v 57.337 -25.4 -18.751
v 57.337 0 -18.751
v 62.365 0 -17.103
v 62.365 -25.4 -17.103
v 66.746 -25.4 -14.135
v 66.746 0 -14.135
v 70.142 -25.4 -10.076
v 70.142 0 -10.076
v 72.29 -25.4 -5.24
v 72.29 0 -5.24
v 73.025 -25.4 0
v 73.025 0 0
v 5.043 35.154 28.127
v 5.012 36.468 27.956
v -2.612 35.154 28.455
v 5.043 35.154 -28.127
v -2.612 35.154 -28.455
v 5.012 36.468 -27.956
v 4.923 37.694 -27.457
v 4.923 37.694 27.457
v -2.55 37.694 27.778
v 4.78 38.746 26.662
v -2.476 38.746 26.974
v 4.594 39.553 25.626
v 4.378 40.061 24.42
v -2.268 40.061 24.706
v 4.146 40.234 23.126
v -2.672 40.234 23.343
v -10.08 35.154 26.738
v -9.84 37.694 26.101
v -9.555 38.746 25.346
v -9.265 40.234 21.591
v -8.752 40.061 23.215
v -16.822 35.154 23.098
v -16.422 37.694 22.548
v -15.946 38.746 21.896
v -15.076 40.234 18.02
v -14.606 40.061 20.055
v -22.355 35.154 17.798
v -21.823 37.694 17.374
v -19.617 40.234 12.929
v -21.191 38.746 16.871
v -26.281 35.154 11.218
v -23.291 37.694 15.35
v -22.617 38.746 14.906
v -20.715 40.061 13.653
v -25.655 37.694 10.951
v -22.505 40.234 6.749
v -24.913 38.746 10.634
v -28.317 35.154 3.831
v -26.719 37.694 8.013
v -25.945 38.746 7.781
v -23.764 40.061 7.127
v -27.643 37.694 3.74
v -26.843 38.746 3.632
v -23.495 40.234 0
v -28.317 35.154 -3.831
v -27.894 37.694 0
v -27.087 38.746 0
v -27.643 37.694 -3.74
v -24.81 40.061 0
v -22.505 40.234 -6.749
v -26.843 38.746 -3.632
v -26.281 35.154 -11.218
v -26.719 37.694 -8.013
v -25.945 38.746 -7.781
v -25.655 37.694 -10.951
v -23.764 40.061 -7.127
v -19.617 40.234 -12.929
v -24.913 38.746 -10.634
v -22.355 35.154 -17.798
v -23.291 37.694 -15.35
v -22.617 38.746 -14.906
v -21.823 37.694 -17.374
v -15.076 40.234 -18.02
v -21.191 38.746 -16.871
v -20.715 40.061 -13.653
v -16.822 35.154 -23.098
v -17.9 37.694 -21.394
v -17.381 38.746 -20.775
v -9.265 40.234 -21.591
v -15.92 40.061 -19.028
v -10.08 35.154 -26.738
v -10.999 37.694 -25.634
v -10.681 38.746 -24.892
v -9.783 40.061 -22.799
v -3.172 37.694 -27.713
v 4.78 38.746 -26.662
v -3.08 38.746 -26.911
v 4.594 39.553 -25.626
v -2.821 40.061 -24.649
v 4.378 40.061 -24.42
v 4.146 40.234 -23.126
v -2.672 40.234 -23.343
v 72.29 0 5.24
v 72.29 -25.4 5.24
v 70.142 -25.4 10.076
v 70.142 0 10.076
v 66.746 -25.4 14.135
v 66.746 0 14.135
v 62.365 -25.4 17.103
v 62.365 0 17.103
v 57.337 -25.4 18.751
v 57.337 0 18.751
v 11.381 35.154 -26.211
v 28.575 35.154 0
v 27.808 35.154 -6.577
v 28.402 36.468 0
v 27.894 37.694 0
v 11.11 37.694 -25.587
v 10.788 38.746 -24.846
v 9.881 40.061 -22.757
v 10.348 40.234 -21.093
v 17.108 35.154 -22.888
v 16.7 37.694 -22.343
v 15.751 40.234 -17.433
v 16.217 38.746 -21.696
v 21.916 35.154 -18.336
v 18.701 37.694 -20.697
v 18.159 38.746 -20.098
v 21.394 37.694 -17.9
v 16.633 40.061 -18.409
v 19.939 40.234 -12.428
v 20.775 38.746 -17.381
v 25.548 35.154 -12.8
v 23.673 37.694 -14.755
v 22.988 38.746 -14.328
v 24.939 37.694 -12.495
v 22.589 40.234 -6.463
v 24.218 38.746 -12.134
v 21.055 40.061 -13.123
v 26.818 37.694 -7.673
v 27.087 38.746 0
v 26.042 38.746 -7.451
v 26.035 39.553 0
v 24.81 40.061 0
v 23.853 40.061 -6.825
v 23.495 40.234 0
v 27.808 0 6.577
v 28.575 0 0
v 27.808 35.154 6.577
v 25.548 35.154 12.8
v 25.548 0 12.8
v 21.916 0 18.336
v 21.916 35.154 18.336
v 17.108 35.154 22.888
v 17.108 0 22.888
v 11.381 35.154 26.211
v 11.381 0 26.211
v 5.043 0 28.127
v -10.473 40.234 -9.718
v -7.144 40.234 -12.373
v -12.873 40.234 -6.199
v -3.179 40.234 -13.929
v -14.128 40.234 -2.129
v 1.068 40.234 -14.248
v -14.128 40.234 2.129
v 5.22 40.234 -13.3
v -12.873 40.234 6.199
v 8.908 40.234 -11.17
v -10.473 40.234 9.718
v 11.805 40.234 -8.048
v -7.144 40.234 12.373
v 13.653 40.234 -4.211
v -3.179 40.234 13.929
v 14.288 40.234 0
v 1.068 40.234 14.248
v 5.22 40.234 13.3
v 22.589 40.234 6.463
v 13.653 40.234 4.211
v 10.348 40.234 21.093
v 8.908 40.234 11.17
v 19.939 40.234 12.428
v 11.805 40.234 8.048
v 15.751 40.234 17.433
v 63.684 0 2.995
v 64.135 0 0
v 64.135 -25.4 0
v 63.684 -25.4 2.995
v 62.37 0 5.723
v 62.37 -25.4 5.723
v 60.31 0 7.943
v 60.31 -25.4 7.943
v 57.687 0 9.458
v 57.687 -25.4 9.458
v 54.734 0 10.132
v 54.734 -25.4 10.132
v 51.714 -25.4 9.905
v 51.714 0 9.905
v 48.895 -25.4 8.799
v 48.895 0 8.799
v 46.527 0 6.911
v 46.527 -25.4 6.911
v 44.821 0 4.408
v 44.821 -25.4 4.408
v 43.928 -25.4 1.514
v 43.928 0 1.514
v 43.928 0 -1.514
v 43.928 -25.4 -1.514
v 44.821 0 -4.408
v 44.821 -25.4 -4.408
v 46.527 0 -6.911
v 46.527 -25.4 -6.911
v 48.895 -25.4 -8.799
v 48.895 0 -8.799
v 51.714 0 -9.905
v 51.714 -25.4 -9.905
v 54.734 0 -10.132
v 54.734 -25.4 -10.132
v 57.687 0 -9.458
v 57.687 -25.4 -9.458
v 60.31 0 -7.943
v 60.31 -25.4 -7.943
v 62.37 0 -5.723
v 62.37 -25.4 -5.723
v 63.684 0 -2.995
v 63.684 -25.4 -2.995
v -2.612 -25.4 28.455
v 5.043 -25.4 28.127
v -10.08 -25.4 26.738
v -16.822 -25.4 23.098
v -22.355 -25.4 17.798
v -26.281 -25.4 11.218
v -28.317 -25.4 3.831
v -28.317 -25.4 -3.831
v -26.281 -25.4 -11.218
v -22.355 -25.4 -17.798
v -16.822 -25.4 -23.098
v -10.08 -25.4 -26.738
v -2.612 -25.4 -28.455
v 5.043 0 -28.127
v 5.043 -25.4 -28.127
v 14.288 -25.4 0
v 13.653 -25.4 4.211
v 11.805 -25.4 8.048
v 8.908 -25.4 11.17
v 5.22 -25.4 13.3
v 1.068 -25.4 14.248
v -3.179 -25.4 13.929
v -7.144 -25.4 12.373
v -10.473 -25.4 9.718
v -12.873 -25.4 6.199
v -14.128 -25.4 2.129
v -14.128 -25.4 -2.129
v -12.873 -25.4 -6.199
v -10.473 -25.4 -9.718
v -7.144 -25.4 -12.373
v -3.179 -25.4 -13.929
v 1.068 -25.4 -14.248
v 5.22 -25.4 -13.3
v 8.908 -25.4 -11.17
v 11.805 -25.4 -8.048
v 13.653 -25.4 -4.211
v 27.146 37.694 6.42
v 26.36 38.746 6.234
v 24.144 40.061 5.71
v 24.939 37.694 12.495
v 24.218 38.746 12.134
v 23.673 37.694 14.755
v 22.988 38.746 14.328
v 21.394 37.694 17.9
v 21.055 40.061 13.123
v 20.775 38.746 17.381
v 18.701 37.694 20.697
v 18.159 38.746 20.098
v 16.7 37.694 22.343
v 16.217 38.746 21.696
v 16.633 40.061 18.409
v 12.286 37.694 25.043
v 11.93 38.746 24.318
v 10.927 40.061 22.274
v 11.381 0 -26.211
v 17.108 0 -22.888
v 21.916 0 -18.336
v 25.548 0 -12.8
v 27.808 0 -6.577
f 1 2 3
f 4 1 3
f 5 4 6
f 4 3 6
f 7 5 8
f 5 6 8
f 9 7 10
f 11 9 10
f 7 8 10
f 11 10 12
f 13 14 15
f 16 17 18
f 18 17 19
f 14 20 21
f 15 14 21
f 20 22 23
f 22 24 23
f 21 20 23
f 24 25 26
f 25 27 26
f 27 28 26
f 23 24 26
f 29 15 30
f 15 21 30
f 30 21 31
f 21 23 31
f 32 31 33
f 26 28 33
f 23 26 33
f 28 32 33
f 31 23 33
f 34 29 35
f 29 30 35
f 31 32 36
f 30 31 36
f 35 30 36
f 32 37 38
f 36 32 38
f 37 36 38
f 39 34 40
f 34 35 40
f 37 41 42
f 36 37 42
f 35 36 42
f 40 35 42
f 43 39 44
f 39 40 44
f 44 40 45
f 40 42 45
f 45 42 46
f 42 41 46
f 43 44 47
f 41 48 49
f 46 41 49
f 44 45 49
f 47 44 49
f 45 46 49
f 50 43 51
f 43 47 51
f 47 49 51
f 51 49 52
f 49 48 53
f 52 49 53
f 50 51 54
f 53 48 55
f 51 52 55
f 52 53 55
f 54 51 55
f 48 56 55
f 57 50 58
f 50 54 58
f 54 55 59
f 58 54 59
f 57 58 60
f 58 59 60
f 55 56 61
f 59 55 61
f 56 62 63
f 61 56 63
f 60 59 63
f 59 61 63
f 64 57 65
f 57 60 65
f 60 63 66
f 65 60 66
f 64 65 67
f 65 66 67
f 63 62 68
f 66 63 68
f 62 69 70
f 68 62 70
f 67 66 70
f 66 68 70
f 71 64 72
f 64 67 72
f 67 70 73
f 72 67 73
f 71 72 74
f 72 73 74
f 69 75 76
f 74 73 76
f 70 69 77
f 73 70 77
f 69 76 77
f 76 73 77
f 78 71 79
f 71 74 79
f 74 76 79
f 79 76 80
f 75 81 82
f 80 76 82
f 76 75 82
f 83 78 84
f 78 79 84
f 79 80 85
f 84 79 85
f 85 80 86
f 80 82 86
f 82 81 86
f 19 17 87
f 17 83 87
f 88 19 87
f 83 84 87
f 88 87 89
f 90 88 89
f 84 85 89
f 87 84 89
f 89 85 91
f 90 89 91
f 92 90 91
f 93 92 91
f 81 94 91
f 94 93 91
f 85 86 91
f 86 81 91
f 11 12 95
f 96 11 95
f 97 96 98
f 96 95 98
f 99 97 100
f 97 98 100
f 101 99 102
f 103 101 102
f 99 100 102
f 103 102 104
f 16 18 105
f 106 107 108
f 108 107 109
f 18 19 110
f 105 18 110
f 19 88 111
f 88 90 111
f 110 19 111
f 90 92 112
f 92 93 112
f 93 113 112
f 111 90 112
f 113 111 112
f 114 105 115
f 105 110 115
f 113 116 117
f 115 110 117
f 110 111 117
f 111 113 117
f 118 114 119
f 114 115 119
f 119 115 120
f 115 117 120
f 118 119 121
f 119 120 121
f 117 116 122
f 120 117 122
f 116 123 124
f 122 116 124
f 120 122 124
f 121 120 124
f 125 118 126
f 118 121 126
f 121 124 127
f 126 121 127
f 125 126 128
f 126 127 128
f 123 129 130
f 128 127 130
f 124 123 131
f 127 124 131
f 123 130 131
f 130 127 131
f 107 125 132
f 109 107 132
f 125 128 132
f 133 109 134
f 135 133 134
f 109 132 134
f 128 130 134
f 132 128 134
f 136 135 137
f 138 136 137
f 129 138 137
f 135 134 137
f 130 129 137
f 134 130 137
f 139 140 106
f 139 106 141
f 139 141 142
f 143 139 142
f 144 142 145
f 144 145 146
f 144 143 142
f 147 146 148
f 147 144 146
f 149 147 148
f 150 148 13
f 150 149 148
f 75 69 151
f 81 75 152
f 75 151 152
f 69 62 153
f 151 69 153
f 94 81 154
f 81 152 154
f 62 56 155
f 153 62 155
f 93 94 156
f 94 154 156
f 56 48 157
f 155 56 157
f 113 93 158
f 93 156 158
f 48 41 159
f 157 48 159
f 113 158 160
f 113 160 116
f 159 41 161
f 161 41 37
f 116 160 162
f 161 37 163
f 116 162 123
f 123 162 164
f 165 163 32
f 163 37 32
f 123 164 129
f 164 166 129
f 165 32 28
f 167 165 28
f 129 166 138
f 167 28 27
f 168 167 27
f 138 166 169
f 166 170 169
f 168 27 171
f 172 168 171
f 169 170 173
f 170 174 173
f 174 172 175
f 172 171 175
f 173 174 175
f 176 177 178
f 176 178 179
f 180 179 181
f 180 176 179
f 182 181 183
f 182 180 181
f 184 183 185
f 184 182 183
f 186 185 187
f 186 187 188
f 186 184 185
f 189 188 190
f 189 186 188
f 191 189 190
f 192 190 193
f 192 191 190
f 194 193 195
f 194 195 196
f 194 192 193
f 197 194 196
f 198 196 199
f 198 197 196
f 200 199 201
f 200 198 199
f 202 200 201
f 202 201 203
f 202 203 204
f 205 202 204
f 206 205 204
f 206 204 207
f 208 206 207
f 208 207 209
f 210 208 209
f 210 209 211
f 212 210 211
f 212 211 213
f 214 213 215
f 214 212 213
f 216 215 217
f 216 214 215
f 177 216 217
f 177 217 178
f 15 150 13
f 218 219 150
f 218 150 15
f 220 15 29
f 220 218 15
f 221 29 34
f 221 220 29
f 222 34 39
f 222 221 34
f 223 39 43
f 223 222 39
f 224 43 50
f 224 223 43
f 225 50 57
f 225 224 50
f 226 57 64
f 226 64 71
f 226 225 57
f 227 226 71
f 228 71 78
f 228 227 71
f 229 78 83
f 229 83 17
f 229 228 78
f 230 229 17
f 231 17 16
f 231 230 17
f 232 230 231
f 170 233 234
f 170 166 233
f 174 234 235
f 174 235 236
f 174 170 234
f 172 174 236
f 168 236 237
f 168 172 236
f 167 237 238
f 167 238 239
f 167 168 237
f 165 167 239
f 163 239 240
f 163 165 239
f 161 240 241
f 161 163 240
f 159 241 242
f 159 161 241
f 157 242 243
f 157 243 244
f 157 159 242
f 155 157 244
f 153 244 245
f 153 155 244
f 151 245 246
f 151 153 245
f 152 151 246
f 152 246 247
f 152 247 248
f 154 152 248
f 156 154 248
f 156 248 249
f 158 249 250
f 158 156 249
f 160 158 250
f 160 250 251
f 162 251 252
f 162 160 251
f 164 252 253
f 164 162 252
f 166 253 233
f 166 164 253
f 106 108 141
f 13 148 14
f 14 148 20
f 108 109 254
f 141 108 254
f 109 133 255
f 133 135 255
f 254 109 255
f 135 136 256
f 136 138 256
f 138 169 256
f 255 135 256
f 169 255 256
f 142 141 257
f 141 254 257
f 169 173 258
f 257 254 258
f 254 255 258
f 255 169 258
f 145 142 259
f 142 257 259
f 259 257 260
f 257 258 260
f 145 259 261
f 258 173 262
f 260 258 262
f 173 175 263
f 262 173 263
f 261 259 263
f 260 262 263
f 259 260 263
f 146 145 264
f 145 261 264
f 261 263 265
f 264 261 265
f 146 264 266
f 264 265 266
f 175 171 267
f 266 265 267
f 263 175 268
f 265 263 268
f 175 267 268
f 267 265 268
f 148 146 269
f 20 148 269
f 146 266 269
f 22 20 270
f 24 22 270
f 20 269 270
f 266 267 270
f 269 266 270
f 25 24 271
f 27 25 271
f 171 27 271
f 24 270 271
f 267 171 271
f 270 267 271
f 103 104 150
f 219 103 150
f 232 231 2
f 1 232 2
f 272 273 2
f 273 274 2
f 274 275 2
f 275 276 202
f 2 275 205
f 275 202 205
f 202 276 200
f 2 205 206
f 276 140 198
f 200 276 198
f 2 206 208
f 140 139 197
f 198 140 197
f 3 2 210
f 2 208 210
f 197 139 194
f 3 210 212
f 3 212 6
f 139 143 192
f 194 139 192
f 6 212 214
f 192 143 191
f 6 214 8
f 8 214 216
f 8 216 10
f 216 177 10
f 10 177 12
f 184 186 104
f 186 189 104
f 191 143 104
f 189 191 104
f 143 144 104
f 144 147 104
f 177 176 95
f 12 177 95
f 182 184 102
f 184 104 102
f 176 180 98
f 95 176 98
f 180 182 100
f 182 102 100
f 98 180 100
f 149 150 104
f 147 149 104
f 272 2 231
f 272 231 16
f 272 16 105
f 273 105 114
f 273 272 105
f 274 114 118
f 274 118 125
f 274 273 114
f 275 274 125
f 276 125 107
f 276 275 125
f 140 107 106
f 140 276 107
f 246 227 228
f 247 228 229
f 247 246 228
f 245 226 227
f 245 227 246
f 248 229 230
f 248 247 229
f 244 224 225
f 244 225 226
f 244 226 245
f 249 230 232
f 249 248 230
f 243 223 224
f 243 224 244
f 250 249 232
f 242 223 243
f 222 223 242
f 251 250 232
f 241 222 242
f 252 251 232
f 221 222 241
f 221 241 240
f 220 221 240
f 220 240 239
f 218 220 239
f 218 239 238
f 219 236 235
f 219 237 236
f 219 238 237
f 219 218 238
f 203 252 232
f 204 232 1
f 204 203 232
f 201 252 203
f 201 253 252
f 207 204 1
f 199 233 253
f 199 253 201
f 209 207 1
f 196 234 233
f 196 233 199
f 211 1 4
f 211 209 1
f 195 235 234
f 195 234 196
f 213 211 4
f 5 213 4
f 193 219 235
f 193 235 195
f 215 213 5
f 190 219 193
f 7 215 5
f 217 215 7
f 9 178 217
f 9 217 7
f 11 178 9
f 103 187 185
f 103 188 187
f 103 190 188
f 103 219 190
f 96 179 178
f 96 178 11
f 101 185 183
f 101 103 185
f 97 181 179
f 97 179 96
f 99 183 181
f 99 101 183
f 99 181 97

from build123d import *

# Parameters (mm, degrees)
F0_R     = 14.2875
F0_R_2   = 10.16
F1_DEPTH = 25.4
F2_DEPTH = 40.2336
F3_R     = 5.08


with BuildPart() as f1:
    # F0 (on Front) → F1 (new body)
    with BuildSketch(Plane.XZ):
        with BuildLine():
            ThreePointArc((5.042647, -28.126541), (21.916025, -18.336262), (28.575, 0))
            ThreePointArc((28.575, 0), (21.916025, 18.336262), (5.042647, 28.126541))
            ThreePointArc((5.042647, 28.126541), (-28.575, 0), (5.042647, -28.126541))
        make_face()
        Circle(F0_R, mode=Mode.SUBTRACT)
        with BuildLine():
            ThreePointArc((5.042647, 28.126541), (21.916025, 18.336262), (28.575, 0))
            ThreePointArc((28.575, 0), (21.916025, -18.336262), (5.042647, -28.126541))
            Line((5.042647, -28.126541), (57.336765, -18.751028))
            ThreePointArc((57.336765, -18.751028), (34.925, 0), (57.336765, 18.751028))
            Line((57.336765, 18.751028), (5.042647, 28.126541))
        make_face()
        with BuildLine():
            ThreePointArc((73.025, 0), (68.585683, 12.224174), (57.336765, 18.751028))
            ThreePointArc((57.336765, 18.751028), (34.925, 0), (57.336765, -18.751028))
            ThreePointArc((57.336765, -18.751028), (68.585683, -12.224174), (73.025, 0))
        make_face()
        with Locations((53.975, 0)):
            Circle(F0_R_2, mode=Mode.SUBTRACT)
    extrude(amount=F1_DEPTH)

    # F0 (on Front) → F2 (join)
    with BuildSketch(Plane.XZ):
        with BuildLine():
            ThreePointArc((5.042647, -28.126541), (21.916025, -18.336262), (28.575, 0))
            ThreePointArc((28.575, 0), (21.916025, 18.336262), (5.042647, 28.126541))
            ThreePointArc((5.042647, 28.126541), (-28.575, 0), (5.042647, -28.126541))
        make_face()
        Circle(F0_R, mode=Mode.SUBTRACT)
    extrude(amount=-F2_DEPTH)

    # F3
    f3_edges = [f1.edges().sort_by_distance(p)[0] for p in [
        (-5.042647, 40.2336, 28.126541),
    ]]
    fillet(f3_edges, radius=F3_R)


solid = f1.part
